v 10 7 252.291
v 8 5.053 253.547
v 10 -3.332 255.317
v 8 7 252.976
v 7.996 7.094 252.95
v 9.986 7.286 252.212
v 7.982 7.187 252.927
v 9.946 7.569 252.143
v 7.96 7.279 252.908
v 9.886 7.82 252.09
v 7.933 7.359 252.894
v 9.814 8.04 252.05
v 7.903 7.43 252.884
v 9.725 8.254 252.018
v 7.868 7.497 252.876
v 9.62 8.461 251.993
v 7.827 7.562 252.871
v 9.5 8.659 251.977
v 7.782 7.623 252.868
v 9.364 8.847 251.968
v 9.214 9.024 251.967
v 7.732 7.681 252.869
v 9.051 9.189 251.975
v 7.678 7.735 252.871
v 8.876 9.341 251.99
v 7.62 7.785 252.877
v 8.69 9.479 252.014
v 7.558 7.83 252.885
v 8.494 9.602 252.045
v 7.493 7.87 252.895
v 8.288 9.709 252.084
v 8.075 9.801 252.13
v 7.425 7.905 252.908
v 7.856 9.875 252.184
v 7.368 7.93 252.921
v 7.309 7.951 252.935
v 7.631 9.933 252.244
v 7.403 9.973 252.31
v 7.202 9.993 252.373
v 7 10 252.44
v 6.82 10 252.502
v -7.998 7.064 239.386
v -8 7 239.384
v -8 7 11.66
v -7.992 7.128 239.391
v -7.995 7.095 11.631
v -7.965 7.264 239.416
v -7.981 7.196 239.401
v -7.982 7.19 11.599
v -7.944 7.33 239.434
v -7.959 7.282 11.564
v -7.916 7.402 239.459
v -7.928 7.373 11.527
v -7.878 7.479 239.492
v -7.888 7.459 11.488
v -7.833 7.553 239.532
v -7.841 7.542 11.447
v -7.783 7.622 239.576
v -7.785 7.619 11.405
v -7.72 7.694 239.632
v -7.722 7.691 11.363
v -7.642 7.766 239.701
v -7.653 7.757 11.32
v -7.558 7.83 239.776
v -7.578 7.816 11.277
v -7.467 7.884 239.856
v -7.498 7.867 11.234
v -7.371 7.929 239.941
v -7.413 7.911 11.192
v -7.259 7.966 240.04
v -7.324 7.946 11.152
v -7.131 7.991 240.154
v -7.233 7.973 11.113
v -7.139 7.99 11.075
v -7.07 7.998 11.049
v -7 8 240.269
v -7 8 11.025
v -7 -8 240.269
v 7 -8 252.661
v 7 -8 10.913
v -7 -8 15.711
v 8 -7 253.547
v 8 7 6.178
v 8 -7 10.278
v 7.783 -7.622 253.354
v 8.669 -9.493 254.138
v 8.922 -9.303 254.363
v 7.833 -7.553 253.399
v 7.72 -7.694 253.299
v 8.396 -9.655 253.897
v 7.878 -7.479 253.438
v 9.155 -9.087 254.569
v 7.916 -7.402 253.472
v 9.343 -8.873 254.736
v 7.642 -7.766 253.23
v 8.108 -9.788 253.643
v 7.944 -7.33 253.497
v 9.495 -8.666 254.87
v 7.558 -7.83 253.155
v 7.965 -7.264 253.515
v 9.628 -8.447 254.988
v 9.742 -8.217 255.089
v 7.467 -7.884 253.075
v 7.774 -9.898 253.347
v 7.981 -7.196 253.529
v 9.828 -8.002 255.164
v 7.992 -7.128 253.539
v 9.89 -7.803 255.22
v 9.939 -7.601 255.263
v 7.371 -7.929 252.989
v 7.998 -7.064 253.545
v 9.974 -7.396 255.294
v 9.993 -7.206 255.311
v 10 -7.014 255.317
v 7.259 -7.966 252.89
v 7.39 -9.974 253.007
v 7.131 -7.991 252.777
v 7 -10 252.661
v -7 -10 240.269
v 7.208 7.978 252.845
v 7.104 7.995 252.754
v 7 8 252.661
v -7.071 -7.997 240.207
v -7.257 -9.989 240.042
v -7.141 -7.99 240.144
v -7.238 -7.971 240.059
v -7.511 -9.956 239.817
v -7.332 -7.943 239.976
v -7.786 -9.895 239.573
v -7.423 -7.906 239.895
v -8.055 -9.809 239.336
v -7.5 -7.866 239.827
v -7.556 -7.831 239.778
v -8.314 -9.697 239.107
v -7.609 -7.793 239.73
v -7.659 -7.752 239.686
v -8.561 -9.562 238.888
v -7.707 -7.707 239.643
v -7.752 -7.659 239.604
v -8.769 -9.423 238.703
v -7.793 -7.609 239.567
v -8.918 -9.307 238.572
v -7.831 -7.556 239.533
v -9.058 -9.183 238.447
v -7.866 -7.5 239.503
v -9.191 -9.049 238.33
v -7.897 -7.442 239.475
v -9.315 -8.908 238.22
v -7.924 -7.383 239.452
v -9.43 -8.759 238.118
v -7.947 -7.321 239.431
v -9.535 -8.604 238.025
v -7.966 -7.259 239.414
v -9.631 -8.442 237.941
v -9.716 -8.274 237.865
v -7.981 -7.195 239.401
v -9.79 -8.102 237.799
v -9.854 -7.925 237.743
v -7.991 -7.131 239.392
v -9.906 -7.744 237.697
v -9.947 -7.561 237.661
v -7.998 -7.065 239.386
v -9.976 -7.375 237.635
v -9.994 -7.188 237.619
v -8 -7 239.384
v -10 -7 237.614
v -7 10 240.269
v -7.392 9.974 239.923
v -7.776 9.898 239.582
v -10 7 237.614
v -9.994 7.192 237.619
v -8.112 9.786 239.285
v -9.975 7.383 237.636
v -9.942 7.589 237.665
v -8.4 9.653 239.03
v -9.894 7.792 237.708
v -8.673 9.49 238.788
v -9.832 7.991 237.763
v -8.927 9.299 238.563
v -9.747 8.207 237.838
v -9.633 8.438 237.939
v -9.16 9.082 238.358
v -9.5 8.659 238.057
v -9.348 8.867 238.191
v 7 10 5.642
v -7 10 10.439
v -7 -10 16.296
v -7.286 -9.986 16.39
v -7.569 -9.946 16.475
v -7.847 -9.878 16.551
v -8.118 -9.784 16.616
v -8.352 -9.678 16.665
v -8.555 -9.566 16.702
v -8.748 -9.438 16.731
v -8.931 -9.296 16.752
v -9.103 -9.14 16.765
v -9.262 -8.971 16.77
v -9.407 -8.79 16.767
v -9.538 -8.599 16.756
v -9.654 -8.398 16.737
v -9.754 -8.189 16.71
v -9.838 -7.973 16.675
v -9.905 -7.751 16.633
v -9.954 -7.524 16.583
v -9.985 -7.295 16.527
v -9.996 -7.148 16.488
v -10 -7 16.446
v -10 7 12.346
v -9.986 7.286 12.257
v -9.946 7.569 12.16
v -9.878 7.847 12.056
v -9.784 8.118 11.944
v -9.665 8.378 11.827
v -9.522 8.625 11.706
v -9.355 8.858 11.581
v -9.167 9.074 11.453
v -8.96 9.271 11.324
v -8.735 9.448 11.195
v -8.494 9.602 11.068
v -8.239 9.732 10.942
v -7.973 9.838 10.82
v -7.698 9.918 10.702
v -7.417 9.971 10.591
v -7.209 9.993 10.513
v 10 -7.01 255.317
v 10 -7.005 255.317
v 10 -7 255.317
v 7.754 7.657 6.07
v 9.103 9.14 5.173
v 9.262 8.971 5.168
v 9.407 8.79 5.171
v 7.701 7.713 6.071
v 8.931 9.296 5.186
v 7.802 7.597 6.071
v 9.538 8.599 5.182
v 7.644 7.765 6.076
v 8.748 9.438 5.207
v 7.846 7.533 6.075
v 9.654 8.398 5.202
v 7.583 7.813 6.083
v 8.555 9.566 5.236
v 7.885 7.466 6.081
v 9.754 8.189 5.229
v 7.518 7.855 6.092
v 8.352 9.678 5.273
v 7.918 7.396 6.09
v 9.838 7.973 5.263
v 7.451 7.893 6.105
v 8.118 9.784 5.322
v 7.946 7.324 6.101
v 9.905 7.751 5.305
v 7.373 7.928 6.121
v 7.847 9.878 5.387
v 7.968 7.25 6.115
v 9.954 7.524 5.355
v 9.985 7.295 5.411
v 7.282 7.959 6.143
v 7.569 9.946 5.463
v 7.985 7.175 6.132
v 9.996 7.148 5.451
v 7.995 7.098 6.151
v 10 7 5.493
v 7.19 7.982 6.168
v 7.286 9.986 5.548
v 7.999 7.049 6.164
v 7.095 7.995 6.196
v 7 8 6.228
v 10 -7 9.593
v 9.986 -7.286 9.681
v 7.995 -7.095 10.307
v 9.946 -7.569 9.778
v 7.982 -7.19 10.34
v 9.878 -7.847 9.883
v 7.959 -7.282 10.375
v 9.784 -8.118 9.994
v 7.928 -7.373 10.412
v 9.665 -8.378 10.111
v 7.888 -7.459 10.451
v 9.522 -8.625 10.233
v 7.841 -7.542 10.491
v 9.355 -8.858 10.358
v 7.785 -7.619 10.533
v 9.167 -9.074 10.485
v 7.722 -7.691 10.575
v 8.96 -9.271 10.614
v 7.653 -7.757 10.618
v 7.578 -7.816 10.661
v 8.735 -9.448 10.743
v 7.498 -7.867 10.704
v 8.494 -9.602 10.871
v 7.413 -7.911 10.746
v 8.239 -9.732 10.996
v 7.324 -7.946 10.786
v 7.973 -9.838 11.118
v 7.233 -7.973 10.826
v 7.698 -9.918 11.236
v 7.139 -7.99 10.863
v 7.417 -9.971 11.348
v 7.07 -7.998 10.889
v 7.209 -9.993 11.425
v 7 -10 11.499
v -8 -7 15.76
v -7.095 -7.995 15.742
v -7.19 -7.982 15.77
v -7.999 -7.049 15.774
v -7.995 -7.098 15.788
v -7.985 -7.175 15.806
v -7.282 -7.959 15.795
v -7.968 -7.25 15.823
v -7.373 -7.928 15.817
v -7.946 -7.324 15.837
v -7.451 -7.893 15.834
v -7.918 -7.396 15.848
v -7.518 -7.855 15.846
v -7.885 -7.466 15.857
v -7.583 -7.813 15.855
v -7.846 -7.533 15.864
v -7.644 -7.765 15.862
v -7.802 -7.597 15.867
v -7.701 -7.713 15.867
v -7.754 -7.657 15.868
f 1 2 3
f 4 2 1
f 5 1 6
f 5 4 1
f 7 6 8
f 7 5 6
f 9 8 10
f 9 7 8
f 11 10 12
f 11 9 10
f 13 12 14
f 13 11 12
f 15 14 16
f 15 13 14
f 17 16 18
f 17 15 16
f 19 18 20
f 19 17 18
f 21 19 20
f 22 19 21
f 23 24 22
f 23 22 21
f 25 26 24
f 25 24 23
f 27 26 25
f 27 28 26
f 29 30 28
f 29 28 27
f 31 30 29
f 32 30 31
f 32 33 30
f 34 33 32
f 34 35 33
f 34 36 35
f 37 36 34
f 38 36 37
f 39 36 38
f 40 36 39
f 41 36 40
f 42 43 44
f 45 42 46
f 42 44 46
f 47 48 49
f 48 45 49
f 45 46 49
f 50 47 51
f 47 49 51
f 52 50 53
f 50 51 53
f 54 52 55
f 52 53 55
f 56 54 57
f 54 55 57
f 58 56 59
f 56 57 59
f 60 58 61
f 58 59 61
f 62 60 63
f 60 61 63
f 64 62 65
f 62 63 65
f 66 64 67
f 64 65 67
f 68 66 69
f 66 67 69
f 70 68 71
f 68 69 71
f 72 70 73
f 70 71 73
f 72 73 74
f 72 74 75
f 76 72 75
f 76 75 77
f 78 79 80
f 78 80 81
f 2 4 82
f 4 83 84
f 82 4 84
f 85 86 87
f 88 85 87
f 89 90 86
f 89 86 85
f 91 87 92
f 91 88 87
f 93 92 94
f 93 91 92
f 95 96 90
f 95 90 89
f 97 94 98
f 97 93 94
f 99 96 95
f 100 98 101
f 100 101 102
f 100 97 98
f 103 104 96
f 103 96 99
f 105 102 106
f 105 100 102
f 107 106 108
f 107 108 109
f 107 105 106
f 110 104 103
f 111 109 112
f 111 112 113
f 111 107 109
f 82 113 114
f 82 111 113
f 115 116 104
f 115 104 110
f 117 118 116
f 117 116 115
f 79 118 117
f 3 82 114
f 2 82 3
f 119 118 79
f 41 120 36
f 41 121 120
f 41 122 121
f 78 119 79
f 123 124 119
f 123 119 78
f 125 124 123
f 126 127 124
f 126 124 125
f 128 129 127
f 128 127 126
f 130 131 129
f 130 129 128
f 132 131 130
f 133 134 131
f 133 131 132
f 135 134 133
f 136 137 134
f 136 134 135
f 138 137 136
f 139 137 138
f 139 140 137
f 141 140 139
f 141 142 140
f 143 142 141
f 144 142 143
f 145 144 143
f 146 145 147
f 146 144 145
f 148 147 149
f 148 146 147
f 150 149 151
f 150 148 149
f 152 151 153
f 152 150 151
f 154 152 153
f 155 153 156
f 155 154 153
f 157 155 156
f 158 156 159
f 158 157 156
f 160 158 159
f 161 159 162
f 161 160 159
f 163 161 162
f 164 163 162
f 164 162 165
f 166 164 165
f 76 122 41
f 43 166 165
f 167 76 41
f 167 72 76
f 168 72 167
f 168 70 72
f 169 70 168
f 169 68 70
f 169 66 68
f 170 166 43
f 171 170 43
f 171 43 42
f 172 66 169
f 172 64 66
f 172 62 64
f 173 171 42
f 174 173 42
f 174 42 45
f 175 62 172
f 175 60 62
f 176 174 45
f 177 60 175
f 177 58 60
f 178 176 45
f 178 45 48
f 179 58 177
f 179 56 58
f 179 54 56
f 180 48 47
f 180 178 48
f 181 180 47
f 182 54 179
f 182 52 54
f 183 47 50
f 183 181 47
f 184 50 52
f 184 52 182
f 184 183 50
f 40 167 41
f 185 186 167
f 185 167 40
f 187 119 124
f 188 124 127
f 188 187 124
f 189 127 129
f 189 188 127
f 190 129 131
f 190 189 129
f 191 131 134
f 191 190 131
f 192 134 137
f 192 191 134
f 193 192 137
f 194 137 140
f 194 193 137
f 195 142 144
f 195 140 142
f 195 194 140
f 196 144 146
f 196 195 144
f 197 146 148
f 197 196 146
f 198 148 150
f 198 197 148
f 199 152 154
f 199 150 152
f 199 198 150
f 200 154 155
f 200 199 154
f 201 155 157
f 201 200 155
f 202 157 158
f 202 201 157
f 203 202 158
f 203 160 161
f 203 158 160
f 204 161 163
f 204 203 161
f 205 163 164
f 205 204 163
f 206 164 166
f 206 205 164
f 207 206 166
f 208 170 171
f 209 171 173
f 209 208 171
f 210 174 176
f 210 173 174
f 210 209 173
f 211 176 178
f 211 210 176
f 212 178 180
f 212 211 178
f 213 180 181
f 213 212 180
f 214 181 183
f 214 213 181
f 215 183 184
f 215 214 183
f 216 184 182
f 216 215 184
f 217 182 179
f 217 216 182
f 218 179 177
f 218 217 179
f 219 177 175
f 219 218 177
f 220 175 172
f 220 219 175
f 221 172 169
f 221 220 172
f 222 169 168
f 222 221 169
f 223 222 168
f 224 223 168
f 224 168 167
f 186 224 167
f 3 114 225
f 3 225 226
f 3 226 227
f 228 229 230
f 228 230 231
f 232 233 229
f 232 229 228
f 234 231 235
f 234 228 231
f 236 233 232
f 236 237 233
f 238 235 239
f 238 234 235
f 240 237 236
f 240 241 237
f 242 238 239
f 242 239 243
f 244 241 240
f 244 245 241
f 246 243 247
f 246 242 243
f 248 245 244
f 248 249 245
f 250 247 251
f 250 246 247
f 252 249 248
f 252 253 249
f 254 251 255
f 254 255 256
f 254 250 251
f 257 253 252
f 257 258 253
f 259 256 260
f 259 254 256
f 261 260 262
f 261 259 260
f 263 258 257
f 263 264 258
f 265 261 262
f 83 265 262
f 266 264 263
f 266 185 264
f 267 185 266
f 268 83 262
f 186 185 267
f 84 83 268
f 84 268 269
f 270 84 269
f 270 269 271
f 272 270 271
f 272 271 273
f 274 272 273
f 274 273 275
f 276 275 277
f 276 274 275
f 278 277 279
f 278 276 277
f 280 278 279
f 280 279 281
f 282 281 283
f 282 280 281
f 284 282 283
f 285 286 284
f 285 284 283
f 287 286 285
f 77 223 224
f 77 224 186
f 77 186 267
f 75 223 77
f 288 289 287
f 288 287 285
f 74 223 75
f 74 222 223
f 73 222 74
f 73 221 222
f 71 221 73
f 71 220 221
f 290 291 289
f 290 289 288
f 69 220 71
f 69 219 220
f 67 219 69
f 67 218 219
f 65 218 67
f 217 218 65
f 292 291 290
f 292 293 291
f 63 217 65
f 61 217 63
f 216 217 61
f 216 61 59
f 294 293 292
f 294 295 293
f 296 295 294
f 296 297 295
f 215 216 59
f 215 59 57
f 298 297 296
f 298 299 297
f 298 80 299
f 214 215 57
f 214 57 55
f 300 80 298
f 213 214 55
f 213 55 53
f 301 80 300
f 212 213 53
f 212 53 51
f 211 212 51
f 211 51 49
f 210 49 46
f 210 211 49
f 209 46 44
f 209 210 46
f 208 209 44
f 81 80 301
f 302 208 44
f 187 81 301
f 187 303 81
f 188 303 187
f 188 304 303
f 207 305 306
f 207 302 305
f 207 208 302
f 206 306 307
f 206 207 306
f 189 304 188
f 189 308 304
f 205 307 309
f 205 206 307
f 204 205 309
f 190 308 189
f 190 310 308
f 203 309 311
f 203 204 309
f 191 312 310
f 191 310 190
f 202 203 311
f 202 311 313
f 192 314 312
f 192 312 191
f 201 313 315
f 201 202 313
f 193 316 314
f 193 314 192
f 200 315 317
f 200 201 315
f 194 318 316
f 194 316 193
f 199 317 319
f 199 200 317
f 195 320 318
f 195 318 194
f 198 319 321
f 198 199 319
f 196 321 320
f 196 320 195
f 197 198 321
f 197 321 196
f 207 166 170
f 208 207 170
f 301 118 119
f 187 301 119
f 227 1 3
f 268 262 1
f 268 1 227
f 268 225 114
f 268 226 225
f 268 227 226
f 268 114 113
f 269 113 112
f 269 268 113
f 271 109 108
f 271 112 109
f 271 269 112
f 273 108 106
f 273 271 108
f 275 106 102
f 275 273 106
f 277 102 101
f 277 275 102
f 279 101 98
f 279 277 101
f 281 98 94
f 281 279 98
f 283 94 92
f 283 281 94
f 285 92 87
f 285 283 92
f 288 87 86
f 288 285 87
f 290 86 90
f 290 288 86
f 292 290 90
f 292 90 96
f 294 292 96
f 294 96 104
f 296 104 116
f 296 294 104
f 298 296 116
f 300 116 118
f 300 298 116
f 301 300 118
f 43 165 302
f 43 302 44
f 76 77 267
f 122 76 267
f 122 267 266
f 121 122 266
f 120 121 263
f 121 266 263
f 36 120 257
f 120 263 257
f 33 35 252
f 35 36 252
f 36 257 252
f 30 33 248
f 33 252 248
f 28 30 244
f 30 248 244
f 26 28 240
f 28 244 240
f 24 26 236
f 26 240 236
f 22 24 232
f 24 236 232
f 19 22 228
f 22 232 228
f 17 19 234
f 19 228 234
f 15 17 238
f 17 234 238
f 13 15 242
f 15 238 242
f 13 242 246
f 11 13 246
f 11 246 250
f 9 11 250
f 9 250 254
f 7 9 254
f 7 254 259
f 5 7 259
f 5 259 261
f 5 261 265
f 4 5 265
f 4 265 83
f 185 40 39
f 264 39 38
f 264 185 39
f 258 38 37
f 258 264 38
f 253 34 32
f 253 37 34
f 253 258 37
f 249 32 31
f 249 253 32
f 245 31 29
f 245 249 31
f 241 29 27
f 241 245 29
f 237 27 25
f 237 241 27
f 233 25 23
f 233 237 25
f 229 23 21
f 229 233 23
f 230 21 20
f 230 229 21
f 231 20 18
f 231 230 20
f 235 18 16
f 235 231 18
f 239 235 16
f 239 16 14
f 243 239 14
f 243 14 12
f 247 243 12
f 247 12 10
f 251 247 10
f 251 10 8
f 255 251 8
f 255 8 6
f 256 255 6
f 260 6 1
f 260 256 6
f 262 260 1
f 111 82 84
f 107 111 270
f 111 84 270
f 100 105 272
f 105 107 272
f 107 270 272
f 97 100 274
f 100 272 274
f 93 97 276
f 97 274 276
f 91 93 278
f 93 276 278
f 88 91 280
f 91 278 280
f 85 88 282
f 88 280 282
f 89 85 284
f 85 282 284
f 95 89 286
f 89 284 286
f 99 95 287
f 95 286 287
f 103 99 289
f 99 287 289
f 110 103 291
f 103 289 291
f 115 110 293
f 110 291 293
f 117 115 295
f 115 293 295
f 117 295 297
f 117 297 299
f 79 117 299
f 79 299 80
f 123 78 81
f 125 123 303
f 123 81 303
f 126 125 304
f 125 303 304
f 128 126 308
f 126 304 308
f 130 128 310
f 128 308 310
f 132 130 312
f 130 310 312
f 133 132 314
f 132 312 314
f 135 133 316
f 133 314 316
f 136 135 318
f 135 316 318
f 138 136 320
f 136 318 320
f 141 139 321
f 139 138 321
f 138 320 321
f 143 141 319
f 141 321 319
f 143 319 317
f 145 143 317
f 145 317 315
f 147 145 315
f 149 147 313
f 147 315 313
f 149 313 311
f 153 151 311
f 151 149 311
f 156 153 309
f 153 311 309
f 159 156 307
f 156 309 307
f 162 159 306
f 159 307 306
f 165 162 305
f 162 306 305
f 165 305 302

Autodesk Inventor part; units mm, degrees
ref_plane "Start Plane" through (0, 0, 4.614) normal (0, 0, 1) x (1, 0, 0)
ref_plane "End Plane" through (0, 0, 255.3168) normal (0, 0, 1) x (1, 0, 0)
sketch "Sketch" plane through (0, 0, 0) normal (0, 0, 1) x (1, 0, 0)
  line L0 (-10, -7) -> (-10, 7)
  line L1 (-7, 10) -> (7, 10)
  line L2 (10, 7) -> (10, -7)
  line L3 (7, -10) -> (-7, -10)
  arc A0 (-10, -7) -> (-7, -10) centre (-7, -7) ccw
  arc A1 (-7, 10) -> (-10, 7) centre (-7, 7) ccw
  arc A2 (10, 7) -> (7, 10) centre (7, 7) ccw
  arc A3 (7, -10) -> (10, -7) centre (7, -7) ccw
  arc A4 (-7, 8) -> (-8, 7) centre (-7, 7) ccw
  line L4 (-7, 8) -> (7, 8)
  arc A5 (8, 7) -> (7, 8) centre (7, 7) ccw
  line L5 (8, 7) -> (8, -7)
  arc A6 (7, -8) -> (8, -7) centre (7, -7) ccw
  line L6 (7, -8) -> (-7, -8)
  arc A7 (-8, -7) -> (-7, -8) centre (-7, -7) ccw
  line L7 (-8, -7) -> (-8, 7)
  line L8 (0, 14.8698) -> (0, -14.8698) construction
  line L9 (-14.8698, 0) -> (14.8698, 0) construction
  dimension "d7" = 3
  dimension "d10" = 20
  dimension "d11" = 20
  dimension "d12" = 2
  dimension "d15" = 10
  dimension "d16" = 10
extrude "Body" add sketch "Sketch" along normal up to surface (250.7028 mm away) from surface at 4.614
sketch "Sketch3" plane through (0, 0, 0) normal (0, 0, 1) x (1, 0, 0)
  line L0 (0, 0) -> (10, 0)
ref_plane "Work Plane3" through (0, 0, 0) normal (0, -1, 0) x (1, 0, 0)
sketch "Sketch4" plane through (0, 0, 0) normal (0, -1, 0) x (1, 0, 0)
  line L0 (-2, 4.614) -> (12, 4.614)
  line L1 (-2, 255.3168) -> (12, 255.3168)
  dimension "d18" = 250.7028
ref_plane "Work Plane4" through (10.1657, 0, 255.4635) normal (-0.6628, 0, 0.7488) x (0.7488, 0, 0.6628)
split "Split1" plane through (10.1657, 0, 255.4635) removes the side toward (-0.6628, 0, 0.7488)
ref_plane "Work Plane8" through (-138.1713, -4.0763, 306.3066) normal (0.3124, 0.267, 0.9117) x (0.949, -0.0436, -0.3124)
split "Split2" plane through (-138.1713, -4.0763, 306.3066) removes the side toward (0.3124, 0.267, 0.9117)
ref_plane "Work Plane9" through (-4.1619, 10.0613, 9.4487) normal (-0.3124, -0.267, -0.9117) x (-0.1048, -0.9442, 0.3124)
split "Split3" plane through (-4.1619, 10.0613, 9.4487) removes the side toward (-0.3124, -0.267, -0.9117)
equation "\"d7\" = G_IR"
equation "\"d10\" = G_H"
equation "\"d11\" = G_W"
equation "\"d12\" = G_T"
equation "\"d15\" = 0.5 * d10"
equation "\"d16\" = 0.5 * d11"
equation "\"d3\" = G_L"
equation "\"G_W\" = 20"
equation "\"G_H\" = 20"
equation "\"G_T\" = 2"
equation "\"G_IR\" = 3"
equation "\"G_L\" = 250.12582"
equation "\"G_OFFSET_START\" = -4.61403"
equation "\"G_OFFSET_END\" = 8.51725"
equation "\"d13\" = -G_OFFSET_START"
equation "\"d14\" = G_OFFSET_END + B_L"
equation "\"B_L\" = 246.79957"
properties part number "ISO 12633-2 - 20x20x2 - 250,13" material "Steel, Mild"
